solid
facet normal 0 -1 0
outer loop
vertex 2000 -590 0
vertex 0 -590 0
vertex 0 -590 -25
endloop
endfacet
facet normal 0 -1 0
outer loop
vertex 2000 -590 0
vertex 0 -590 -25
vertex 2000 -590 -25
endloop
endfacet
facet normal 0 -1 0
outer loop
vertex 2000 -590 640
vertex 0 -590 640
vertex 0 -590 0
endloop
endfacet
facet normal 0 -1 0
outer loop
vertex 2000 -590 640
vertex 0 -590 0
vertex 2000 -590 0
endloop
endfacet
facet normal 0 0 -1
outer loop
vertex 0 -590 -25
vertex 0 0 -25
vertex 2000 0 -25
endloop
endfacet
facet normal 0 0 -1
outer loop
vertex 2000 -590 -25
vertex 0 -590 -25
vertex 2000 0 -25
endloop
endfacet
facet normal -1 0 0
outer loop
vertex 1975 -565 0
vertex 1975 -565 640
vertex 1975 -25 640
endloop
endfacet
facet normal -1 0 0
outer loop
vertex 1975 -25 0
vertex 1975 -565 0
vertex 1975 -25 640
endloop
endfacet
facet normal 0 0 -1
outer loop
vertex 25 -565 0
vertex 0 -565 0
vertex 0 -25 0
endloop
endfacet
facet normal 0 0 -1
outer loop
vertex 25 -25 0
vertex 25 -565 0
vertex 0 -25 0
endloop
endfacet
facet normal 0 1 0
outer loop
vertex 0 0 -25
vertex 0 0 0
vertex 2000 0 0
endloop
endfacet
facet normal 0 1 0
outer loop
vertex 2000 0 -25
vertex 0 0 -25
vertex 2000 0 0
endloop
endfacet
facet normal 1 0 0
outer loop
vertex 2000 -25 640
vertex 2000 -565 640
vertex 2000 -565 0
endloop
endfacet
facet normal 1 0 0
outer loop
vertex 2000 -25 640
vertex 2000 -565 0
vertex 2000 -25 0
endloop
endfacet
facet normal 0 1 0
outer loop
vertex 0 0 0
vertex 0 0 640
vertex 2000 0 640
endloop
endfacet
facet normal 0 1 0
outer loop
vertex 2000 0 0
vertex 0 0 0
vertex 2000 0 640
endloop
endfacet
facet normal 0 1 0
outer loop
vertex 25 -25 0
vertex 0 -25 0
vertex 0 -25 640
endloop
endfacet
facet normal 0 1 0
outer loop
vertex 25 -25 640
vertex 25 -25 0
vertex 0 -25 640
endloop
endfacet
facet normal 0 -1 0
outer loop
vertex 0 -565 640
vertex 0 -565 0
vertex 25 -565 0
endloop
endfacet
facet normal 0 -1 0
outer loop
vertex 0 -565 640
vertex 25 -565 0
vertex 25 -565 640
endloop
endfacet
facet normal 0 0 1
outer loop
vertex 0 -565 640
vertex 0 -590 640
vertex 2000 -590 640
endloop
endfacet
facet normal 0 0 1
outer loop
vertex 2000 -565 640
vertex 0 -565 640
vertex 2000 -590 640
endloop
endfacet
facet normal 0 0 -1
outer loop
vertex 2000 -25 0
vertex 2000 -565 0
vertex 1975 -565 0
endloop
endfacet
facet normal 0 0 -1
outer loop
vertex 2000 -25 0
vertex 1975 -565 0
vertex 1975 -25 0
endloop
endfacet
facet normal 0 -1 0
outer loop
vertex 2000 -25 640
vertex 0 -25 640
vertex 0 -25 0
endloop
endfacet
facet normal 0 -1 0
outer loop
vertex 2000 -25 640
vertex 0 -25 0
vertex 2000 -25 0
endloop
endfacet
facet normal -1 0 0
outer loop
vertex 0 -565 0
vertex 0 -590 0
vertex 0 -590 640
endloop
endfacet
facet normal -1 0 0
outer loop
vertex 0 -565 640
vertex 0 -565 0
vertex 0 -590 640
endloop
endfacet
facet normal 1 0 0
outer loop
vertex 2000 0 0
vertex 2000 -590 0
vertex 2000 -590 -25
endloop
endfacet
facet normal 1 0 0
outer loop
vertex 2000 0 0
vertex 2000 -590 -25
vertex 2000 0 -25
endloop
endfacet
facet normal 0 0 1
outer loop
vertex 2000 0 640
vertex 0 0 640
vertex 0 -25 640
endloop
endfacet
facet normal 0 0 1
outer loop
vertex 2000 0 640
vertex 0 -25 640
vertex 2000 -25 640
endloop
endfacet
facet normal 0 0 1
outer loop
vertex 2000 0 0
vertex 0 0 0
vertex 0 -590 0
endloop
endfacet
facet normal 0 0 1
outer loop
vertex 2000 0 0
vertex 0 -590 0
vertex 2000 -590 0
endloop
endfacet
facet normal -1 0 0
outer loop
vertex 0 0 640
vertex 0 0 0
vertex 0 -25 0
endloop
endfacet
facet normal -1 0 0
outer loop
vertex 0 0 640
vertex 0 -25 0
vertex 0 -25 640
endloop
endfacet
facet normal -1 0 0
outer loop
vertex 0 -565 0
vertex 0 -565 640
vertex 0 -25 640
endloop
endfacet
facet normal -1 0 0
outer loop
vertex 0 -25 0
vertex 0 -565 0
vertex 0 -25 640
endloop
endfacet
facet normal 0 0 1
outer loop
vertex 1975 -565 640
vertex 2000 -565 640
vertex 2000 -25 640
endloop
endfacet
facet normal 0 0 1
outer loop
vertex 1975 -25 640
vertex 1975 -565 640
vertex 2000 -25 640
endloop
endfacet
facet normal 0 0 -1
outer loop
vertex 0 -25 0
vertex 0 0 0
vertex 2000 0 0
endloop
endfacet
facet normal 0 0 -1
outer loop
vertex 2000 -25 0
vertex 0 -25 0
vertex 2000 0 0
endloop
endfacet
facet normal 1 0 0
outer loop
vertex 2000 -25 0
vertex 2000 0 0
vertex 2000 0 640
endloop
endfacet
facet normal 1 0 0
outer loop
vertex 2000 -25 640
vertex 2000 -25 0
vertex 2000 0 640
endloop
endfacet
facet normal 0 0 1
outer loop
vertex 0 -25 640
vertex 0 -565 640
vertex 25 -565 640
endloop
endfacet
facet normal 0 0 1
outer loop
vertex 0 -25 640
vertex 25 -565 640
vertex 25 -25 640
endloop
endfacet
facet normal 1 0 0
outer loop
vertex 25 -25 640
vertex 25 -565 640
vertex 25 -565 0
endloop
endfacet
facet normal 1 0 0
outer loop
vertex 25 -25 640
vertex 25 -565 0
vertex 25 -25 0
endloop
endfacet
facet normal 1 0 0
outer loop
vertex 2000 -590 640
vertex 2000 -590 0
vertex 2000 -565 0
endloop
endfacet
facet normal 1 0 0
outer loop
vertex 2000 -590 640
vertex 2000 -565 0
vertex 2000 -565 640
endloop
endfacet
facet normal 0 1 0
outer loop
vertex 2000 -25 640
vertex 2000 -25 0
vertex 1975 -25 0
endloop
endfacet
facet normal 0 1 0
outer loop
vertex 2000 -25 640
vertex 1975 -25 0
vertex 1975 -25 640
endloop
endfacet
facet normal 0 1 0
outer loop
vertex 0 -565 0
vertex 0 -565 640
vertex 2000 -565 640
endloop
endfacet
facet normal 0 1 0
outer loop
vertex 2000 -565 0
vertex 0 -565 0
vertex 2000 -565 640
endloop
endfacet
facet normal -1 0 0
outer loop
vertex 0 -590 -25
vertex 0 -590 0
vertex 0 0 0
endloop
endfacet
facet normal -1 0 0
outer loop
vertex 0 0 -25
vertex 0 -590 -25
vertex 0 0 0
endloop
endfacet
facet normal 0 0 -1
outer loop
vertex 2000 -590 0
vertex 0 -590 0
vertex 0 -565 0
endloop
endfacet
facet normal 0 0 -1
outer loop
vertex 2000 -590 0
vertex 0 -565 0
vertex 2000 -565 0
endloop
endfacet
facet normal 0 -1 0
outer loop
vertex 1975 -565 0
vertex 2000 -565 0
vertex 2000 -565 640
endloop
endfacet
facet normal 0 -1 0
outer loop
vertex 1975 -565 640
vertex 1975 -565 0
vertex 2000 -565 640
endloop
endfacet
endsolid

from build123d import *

# Parameters (mm, degrees)
F0_W     = 2000
F0_H     = 640
F1_DEPTH = 25
F2_W     = 2000
F2_H     = 590
F3_DEPTH = 25
F5_W     = 540
F5_H     = 640
F6_DEPTH = 25
F7_W     = 540
F7_H     = 640
F8_DEPTH = 25


# Not quite as in the source:
# - a feature of the source that left no trace in its solid (it failed there, or was rolled back) is left out
# - a pattern or mirror of a feature is missing from the dataset's text; its kind, count and spacing are read off the source's solid


with BuildPart() as f1:
    # F0 (on Front) → F1 (new body)
    with BuildSketch(Plane.XZ):
        with Locations((1000, 320)):
            Rectangle(F0_W, F0_H)
    extrude(amount=F1_DEPTH)


with BuildPart() as f1_copies_1:
    # F1_copies: instance of F1
    add(f1.part.mirror(Plane(origin=(0, -295, 0), x_dir=(0, 0, -1), z_dir=(0, -1, 0))))


with BuildPart() as f3:
    # F2 (on Top) → F3 (new body)
    with BuildSketch(Plane.XY):
        with Locations((1000, -295)):
            Rectangle(F2_W, F2_H)
    extrude(amount=-F3_DEPTH)


with BuildPart() as f6:
    # F5 (on Right) → F6 (new body)
    with BuildSketch(Plane.YZ):
        with Locations((-295, 320)):
            Rectangle(F5_W, F5_H)
    extrude(amount=F6_DEPTH)


with BuildPart() as f8:
    # F7 (on face) → F8 (new body)
    with BuildSketch(Plane.YZ.offset(2000)):
        with Locations((-295, 320)):
            Rectangle(F7_W, F7_H)
    extrude(amount=-F8_DEPTH)


solid = Compound([f1.part, f1_copies_1.part, f3.part, f6.part, f8.part])
